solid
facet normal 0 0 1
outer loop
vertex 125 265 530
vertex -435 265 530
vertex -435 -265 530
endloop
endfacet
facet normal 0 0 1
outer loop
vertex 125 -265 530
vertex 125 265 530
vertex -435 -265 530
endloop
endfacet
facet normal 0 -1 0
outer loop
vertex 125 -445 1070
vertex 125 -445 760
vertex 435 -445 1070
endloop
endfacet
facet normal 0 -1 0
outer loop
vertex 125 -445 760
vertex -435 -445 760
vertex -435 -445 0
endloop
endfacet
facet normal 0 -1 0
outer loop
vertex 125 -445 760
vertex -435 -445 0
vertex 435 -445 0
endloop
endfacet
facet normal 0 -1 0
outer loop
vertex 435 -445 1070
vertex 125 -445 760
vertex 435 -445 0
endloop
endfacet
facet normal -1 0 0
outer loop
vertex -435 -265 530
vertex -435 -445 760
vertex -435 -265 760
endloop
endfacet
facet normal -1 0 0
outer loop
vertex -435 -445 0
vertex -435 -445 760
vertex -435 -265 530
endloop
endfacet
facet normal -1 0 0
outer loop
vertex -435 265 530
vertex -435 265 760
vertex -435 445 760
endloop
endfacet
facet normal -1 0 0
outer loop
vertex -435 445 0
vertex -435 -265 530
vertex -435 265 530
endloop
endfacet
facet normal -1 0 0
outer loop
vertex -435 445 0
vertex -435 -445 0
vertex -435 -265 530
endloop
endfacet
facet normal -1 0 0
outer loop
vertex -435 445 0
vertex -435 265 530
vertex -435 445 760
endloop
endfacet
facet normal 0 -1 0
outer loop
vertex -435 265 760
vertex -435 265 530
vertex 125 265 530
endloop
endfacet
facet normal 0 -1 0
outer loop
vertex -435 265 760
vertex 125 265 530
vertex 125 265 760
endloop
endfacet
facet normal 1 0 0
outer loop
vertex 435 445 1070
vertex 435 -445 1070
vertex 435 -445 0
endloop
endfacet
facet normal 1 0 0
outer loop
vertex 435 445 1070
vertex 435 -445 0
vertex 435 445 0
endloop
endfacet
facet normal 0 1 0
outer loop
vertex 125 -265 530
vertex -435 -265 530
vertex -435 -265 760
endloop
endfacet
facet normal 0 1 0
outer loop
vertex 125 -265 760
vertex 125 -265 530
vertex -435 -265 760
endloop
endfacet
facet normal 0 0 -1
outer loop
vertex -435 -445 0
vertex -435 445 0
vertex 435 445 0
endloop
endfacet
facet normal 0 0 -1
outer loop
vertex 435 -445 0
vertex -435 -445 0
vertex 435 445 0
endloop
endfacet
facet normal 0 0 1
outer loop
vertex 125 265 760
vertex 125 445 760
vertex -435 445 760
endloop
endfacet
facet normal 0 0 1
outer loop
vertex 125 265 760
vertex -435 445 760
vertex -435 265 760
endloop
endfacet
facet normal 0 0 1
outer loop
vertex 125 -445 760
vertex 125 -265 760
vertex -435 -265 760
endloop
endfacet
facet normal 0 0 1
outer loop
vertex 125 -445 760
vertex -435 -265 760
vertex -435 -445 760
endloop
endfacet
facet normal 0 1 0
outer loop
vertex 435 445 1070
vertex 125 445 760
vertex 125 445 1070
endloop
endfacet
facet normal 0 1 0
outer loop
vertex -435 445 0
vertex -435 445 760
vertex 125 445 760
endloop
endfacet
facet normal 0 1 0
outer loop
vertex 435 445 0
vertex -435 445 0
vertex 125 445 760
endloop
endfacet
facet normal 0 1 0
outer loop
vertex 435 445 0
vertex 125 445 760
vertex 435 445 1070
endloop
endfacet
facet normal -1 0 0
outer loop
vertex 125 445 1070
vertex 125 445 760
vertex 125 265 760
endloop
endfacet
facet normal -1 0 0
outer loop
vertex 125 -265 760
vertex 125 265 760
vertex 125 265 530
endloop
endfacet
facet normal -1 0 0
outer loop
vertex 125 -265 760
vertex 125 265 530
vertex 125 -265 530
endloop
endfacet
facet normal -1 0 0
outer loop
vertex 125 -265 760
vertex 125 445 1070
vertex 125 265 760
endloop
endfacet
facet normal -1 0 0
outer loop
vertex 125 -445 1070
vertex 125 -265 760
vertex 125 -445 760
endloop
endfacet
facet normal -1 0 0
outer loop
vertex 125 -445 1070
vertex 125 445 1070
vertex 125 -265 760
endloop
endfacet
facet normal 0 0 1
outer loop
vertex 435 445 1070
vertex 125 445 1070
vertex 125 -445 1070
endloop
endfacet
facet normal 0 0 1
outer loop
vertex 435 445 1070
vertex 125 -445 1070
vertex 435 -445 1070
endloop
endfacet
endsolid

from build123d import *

# Parameters (mm, degrees)
F0_W     = 870
F0_H     = 890
F1_DEPTH = 1070
F2_W     = 530
F2_H     = 540
F3_DEPTH = 560
F4_W     = 180
F4_H     = 310
F5_DEPTH = 560


with BuildPart() as f1:
    # F0 (on Top) → F1 (new body)
    with BuildSketch(Plane.XY):
        Rectangle(F0_W, F0_H)
    extrude(amount=F1_DEPTH)

    # F2 (on face) → F3 (cut)
    with BuildSketch(Plane(origin=(-435, 0, 0), x_dir=(0, -1, 0), z_dir=(-1, 0, 0))):
        with Locations((0, 800)):
            Rectangle(F2_W, F2_H)
    extrude(amount=-F3_DEPTH, mode=Mode.SUBTRACT)

    # F4 (on face) → F5 (cut, through all)
    with BuildSketch(Plane(origin=(-435, 0, 0), x_dir=(0, -1, 0), z_dir=(-1, 0, 0))):
        with Locations((-355, 915)):
            Rectangle(F4_W, F4_H)
        with Locations((355, 915)):
            Rectangle(F4_W, F4_H)
    extrude(amount=-F5_DEPTH, mode=Mode.SUBTRACT)


solid = f1.part
